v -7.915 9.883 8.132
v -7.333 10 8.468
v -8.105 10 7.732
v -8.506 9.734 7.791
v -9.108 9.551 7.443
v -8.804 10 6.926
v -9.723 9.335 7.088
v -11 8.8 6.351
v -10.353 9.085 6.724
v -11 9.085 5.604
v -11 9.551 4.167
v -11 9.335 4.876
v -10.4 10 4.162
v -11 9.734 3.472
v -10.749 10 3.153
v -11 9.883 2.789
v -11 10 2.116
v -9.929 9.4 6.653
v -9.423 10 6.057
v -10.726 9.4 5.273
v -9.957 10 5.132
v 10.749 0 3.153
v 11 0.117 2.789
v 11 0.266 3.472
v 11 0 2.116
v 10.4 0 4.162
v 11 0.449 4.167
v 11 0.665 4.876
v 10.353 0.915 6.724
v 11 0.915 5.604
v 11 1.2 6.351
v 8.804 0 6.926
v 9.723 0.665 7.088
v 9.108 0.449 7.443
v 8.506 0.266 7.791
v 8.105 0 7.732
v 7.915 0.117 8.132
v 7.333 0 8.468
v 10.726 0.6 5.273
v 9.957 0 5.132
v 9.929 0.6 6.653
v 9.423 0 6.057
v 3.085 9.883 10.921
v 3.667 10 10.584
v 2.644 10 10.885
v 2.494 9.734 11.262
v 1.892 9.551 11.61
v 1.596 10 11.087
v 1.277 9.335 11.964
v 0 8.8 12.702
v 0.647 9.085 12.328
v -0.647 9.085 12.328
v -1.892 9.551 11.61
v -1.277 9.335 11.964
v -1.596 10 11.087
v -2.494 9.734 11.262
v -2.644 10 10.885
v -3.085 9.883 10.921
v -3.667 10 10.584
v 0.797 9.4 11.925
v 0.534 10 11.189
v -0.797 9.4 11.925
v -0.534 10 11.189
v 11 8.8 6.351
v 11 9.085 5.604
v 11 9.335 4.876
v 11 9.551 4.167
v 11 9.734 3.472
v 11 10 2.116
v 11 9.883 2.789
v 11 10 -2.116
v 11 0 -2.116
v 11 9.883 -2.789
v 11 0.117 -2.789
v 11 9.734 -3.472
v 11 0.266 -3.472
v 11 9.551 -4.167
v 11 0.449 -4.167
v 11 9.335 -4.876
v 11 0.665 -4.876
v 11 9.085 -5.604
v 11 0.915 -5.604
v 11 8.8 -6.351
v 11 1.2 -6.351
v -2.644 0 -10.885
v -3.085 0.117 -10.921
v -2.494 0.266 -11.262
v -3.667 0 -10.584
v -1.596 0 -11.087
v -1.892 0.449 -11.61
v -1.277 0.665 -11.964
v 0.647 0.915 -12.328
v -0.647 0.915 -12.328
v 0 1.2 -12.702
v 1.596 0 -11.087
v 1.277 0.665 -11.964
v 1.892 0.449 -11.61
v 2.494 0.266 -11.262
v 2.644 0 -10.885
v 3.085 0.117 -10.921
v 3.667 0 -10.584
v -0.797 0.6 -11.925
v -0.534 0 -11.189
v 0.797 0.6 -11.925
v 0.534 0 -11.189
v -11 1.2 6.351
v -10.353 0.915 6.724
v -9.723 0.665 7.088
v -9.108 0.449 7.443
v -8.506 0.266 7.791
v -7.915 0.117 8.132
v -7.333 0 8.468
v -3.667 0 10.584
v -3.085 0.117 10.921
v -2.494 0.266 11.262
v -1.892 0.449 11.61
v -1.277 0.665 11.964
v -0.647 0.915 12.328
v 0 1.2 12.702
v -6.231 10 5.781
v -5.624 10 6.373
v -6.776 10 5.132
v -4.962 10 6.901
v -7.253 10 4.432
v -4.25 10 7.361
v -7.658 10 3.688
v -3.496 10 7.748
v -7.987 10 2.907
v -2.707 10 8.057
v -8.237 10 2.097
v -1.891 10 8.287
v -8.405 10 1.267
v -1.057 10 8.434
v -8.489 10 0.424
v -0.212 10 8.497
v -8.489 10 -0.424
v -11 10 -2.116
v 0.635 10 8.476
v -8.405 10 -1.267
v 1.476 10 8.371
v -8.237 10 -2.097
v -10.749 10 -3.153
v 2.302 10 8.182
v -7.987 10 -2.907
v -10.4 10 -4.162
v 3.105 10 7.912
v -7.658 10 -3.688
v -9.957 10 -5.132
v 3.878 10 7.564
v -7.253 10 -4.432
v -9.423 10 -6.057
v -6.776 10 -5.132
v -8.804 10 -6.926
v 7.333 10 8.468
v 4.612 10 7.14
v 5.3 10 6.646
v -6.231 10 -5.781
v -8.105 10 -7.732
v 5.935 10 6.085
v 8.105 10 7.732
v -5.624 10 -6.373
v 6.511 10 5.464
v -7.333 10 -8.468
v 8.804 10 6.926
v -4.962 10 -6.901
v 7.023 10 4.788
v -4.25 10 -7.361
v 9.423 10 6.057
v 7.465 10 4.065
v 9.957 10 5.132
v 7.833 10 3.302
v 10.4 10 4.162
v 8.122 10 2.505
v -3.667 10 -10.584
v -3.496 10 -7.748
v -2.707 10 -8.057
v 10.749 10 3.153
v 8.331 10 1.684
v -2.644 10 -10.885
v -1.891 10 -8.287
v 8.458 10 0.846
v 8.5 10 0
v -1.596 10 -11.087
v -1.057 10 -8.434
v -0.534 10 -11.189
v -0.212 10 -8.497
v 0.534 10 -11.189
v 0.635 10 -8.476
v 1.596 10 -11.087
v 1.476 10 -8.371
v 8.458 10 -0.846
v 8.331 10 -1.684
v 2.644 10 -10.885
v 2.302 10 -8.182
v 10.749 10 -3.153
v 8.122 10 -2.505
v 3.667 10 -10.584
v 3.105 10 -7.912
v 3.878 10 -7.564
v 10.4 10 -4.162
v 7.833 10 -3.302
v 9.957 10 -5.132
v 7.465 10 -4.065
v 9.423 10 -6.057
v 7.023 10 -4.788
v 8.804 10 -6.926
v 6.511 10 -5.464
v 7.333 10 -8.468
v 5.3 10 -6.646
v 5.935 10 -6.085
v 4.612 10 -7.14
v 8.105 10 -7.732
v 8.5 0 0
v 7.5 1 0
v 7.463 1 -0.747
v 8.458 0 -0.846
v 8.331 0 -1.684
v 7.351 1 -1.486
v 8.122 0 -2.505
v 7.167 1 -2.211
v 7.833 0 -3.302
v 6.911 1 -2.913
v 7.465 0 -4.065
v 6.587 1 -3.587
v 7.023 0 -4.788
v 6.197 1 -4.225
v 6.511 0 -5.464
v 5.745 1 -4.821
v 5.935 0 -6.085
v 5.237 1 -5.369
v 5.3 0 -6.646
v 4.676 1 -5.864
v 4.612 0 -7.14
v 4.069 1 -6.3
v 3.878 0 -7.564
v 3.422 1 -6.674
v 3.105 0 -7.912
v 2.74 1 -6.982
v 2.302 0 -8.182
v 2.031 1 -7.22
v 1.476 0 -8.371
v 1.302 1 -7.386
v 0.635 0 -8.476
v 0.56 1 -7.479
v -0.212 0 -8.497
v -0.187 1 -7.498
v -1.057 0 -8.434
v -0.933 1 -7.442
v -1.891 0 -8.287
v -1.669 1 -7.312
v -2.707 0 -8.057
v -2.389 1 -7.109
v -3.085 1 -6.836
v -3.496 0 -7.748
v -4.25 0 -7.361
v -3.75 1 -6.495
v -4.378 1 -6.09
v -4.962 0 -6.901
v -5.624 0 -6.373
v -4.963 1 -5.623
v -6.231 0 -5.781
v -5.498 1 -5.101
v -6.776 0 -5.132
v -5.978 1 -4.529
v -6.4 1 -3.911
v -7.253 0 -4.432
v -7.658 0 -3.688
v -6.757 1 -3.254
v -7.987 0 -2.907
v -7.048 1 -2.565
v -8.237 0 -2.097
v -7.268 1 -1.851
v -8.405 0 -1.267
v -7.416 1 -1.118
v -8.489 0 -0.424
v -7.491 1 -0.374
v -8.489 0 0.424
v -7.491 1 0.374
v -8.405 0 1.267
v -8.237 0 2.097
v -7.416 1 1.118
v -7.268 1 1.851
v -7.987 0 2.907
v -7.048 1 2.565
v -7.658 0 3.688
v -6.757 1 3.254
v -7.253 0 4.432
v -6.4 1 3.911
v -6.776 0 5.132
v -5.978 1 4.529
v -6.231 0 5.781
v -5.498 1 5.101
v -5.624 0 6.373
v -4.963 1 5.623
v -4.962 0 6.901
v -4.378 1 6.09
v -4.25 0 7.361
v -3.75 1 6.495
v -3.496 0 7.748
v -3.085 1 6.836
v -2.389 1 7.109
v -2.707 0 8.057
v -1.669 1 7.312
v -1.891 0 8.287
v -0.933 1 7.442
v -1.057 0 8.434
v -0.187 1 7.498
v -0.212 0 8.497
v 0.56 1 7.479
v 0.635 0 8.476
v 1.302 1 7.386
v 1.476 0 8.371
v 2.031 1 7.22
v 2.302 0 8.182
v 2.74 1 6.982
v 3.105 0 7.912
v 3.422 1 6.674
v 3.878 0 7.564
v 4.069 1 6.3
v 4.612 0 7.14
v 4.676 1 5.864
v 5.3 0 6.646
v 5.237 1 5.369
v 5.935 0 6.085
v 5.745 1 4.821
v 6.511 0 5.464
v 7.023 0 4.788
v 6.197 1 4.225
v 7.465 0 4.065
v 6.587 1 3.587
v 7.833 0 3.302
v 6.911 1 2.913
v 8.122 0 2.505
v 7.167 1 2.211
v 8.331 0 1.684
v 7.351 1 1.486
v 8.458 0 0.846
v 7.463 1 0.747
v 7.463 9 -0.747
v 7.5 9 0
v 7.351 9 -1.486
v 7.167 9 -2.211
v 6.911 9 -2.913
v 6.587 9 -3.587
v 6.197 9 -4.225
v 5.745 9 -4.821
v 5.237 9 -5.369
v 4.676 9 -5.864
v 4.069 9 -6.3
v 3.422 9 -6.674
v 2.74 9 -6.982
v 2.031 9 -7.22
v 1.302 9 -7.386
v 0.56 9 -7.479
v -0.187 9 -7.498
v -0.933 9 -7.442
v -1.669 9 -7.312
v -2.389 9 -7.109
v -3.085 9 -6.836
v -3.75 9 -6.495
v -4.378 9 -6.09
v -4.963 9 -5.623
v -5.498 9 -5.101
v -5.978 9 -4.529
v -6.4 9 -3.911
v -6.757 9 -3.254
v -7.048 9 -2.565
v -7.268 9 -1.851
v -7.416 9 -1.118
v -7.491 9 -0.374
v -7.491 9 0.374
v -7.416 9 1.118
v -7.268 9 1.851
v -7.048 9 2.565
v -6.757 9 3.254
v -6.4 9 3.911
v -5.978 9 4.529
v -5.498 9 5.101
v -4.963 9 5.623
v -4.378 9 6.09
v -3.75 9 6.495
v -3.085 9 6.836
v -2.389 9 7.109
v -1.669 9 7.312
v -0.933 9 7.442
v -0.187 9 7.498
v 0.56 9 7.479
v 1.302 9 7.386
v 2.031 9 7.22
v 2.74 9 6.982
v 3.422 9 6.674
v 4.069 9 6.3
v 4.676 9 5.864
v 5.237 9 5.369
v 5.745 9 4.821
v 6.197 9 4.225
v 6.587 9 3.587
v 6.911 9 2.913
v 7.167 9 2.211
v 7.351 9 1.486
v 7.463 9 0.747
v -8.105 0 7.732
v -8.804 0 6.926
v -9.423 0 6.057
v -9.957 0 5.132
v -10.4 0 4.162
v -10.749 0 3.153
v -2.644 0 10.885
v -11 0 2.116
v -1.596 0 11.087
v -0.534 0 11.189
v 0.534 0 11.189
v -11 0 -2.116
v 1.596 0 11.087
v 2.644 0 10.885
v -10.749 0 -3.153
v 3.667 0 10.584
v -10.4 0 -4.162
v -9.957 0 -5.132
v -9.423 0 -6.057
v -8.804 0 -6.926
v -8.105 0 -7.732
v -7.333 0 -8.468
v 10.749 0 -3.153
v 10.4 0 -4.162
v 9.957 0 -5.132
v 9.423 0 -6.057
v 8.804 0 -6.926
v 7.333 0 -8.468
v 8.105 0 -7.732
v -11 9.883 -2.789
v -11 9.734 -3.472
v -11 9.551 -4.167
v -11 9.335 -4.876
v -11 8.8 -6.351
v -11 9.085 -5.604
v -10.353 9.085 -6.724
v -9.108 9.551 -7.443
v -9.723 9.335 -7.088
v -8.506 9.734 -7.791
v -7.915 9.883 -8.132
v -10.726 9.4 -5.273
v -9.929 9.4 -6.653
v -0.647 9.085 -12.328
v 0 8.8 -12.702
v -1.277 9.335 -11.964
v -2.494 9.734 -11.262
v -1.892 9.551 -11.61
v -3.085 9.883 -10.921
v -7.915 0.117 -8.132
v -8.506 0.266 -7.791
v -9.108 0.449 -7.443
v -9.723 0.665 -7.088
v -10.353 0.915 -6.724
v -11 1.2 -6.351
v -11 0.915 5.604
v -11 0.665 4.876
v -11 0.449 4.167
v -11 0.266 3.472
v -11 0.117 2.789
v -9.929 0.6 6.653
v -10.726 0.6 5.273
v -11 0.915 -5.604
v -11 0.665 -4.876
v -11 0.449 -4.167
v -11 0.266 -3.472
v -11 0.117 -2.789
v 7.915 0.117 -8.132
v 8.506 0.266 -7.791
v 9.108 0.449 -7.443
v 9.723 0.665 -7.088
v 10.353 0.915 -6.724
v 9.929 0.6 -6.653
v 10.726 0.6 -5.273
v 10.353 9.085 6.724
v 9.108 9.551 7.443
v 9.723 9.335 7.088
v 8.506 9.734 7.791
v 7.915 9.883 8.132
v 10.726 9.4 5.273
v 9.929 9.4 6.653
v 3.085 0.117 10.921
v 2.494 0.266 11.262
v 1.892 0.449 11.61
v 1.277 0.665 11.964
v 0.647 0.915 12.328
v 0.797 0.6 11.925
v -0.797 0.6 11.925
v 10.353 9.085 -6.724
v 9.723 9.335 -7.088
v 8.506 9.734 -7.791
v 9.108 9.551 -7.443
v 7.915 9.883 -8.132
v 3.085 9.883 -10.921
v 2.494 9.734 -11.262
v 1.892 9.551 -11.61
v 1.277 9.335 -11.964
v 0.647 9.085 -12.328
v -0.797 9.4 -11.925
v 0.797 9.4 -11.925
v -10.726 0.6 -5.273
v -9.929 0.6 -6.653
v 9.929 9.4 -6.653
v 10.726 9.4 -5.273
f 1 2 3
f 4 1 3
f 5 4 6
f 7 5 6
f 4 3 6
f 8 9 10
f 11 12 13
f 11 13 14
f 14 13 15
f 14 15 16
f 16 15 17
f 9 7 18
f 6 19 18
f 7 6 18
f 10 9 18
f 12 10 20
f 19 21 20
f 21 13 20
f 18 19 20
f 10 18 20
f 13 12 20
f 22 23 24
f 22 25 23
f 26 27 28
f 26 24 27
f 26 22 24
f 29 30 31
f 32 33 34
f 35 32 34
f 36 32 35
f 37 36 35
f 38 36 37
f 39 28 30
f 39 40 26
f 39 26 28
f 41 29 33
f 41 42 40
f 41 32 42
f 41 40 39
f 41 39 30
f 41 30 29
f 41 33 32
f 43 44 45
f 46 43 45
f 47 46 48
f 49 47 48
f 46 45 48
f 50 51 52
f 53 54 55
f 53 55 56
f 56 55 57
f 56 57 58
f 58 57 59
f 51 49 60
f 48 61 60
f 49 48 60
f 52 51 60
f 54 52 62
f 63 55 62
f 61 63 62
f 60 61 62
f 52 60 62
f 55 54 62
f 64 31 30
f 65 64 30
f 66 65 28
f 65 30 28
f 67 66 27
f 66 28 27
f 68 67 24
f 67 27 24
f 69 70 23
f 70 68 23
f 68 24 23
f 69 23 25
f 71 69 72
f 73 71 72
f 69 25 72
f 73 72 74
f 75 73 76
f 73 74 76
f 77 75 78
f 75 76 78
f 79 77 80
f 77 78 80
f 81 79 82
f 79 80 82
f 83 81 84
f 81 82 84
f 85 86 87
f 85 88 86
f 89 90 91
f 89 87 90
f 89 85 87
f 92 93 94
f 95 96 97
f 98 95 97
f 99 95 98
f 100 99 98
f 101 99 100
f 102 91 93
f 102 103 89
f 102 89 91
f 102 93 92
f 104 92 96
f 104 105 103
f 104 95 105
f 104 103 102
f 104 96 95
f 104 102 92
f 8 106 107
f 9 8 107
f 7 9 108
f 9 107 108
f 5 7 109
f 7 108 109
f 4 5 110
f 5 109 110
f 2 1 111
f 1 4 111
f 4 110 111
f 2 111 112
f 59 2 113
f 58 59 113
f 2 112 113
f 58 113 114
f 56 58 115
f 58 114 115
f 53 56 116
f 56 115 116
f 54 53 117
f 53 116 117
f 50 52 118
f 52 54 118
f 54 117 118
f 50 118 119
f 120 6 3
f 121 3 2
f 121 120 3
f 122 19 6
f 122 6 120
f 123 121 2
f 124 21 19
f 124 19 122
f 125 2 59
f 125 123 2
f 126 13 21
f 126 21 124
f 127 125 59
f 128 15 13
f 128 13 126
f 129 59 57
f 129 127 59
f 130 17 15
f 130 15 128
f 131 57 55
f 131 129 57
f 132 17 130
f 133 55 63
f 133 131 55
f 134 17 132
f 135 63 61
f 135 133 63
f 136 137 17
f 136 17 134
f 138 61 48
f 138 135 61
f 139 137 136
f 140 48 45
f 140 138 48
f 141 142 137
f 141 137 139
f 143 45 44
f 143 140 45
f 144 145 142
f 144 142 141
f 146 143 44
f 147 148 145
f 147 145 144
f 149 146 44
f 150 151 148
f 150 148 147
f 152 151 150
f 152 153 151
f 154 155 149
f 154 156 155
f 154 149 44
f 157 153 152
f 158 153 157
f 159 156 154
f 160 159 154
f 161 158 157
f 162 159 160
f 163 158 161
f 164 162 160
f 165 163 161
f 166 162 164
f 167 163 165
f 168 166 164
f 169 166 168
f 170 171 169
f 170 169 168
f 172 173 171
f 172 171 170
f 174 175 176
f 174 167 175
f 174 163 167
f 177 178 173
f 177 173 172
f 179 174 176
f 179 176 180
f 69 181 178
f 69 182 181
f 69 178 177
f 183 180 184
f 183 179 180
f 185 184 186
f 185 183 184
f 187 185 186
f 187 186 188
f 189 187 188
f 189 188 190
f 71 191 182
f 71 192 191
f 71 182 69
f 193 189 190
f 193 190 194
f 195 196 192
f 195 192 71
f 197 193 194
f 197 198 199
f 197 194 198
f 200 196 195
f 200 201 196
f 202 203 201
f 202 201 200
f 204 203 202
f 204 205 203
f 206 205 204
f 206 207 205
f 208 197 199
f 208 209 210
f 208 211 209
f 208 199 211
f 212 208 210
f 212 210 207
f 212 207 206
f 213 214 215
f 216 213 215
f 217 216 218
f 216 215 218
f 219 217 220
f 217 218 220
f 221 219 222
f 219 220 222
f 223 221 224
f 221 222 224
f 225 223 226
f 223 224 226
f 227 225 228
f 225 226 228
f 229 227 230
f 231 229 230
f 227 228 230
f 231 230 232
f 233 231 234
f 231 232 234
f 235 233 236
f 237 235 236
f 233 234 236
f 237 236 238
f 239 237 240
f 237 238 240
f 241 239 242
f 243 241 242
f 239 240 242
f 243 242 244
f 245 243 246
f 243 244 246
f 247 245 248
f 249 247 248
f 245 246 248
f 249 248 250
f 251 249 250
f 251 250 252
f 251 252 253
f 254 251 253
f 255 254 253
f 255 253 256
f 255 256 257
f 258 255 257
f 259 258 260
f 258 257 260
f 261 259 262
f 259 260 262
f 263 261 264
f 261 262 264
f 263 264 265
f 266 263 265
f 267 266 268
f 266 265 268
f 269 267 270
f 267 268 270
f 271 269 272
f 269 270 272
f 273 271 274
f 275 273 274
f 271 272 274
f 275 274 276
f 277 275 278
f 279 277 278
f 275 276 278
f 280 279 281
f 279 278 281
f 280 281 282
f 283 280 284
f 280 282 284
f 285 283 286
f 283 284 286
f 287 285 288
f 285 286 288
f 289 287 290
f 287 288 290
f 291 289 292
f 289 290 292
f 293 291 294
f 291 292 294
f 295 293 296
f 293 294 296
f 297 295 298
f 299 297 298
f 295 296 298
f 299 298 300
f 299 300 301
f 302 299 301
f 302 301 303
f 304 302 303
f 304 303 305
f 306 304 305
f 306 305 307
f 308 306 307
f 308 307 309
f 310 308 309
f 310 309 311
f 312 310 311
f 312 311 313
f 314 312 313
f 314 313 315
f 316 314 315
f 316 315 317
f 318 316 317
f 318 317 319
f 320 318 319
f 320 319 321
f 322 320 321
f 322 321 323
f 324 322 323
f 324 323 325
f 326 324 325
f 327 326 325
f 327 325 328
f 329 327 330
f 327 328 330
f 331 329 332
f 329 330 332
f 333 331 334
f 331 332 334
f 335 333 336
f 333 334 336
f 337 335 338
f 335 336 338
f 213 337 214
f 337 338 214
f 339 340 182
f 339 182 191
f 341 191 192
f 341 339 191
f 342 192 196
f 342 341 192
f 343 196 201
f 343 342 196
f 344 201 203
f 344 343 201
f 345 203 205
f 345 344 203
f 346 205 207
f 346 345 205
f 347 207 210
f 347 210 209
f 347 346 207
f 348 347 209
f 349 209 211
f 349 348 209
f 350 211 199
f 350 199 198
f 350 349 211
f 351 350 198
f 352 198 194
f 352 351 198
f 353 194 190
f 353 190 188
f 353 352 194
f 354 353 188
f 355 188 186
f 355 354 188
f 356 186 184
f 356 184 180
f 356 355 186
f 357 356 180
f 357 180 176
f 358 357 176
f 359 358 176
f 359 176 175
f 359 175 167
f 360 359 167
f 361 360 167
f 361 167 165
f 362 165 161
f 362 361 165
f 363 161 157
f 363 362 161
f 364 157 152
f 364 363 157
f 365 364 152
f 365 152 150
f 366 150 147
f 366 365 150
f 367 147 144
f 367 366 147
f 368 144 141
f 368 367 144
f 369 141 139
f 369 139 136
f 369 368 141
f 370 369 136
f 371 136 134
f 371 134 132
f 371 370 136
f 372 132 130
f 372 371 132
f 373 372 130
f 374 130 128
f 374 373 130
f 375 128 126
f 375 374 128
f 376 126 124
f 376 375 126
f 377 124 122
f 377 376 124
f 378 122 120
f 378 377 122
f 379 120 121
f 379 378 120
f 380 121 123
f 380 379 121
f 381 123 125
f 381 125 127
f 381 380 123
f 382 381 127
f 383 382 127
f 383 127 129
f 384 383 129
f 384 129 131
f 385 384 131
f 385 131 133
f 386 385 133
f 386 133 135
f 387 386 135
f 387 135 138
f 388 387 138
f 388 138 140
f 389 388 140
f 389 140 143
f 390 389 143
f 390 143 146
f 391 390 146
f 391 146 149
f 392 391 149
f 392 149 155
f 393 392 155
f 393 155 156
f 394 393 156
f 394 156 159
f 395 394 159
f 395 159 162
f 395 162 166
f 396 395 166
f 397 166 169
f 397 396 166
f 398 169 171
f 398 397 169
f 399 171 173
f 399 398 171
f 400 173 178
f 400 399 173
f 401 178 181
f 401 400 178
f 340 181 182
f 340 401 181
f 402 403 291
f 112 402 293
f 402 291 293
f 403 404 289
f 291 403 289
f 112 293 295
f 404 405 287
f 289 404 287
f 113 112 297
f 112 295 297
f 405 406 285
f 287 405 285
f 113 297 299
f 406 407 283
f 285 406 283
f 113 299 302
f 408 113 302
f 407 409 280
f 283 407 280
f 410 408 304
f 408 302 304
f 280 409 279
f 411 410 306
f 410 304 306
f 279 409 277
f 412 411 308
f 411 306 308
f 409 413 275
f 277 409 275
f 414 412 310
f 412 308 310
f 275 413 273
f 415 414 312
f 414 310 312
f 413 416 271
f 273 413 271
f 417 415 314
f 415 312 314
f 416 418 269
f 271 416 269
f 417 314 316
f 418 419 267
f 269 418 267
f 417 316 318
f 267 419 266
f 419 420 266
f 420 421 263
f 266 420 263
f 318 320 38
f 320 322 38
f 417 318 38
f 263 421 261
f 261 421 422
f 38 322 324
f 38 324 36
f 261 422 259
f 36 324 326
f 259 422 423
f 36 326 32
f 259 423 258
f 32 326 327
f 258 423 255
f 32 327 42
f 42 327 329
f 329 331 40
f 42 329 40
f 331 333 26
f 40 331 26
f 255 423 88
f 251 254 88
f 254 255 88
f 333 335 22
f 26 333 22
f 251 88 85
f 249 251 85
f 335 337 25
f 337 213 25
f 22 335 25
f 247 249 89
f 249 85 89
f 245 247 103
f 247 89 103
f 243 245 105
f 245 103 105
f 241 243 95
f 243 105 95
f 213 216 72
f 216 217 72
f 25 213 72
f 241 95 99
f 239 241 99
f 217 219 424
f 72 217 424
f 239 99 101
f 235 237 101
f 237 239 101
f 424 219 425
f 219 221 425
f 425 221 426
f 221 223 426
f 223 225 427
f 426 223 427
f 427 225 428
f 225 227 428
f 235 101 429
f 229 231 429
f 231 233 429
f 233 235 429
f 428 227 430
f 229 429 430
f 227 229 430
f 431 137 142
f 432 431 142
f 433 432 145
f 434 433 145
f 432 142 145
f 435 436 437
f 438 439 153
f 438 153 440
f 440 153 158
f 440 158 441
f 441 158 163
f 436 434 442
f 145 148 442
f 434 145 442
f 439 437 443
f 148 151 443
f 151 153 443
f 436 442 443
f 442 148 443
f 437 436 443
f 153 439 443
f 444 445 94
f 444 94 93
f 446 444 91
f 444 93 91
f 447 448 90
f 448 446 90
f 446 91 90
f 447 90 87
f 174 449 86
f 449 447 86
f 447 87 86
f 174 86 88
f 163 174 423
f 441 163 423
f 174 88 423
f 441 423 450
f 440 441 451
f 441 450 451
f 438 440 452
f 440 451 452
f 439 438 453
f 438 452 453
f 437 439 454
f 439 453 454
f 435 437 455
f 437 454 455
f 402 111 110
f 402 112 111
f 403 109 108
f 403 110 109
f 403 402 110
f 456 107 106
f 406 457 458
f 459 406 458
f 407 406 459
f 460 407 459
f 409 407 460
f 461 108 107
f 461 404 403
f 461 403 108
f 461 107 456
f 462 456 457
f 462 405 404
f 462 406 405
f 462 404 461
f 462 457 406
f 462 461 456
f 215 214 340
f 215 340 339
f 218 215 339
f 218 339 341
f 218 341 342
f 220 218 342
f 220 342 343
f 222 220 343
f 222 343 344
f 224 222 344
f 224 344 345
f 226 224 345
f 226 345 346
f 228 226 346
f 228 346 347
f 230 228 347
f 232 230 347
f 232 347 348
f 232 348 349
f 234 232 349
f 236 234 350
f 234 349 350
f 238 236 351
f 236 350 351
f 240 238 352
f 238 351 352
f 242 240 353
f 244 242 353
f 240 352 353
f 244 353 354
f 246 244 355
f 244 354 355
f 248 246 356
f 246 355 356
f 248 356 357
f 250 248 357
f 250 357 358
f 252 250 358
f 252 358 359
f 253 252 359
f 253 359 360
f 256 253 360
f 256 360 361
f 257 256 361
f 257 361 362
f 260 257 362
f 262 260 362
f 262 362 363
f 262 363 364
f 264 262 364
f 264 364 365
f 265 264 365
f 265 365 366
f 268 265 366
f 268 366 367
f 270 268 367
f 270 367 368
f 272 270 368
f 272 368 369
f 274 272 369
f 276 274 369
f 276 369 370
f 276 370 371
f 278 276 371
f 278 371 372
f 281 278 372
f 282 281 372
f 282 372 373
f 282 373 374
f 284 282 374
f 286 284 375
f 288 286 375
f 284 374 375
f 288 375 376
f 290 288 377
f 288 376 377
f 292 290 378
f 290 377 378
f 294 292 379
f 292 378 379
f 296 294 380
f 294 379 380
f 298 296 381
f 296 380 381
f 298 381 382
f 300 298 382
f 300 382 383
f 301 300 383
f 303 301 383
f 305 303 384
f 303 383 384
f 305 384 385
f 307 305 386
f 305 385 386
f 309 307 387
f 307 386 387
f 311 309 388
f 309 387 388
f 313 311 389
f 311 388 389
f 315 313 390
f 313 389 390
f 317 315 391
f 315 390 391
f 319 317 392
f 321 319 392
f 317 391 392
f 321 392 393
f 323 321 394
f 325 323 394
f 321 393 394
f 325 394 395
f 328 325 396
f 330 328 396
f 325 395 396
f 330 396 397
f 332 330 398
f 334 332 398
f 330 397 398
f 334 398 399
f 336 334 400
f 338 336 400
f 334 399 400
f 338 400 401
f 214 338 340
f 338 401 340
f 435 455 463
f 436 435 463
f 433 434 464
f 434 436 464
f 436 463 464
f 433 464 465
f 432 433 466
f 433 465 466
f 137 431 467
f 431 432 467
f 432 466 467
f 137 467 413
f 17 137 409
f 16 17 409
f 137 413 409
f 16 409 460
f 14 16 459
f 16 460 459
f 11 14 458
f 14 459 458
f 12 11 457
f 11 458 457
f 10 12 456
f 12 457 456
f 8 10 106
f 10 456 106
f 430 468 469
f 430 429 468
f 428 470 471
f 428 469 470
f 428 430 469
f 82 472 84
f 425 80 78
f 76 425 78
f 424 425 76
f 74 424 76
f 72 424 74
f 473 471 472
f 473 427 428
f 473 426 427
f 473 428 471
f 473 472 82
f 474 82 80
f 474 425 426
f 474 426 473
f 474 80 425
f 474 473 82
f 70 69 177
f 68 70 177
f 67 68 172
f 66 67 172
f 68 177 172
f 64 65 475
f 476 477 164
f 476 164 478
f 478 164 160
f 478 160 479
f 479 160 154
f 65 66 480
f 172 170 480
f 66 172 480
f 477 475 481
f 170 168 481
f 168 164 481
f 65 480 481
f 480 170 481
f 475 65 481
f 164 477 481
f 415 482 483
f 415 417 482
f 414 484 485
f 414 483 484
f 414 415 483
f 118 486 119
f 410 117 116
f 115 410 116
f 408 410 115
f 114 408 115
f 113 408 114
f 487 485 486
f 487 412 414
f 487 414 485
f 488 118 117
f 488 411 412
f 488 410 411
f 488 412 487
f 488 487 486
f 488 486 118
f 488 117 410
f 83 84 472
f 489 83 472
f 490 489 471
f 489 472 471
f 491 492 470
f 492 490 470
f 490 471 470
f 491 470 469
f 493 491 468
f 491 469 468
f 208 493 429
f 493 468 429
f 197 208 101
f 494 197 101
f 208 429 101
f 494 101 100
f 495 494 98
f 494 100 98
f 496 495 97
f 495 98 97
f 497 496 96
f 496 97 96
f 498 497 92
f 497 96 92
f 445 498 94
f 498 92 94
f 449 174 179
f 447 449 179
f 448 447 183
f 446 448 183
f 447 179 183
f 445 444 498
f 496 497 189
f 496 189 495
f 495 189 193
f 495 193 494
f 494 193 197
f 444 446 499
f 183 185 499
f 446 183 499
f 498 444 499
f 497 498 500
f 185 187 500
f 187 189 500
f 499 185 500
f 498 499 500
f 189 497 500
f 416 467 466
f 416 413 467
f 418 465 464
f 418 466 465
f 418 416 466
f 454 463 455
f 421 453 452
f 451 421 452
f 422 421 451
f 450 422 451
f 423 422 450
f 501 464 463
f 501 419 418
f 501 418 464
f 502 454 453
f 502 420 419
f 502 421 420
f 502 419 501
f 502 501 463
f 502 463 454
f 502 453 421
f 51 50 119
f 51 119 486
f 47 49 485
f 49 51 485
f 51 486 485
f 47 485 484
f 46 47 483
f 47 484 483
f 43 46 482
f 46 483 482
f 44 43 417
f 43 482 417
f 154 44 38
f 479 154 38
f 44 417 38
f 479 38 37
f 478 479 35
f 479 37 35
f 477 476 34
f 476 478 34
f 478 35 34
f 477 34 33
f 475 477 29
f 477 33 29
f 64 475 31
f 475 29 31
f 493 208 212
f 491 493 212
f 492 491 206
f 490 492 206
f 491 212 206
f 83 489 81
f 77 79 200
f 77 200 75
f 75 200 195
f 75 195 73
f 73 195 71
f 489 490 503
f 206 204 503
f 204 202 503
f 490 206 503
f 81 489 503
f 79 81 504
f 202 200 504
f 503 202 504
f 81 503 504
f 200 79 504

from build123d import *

# Parameters (mm, degrees)
BOSS_EXTRUDE1_DEPTH = 10
SKETCH4_R           = 7.5
CUT_EXTRUDE1_DEPTH  = 11
CHAMFER1_SIZE       = 1


with BuildPart() as part:
    # Sketch3 → Boss-Extrude1 (new body)
    with BuildSketch(Plane(origin=(0, 0, 0), x_dir=(1, 0, 0), z_dir=(0, 1, 0))):
        Polygon((-11, 6.350852961), (-11, -6.350852961), (0, -12.701705922), (11, -6.350852961), (11, 6.350852961), (0, 12.701705922), align=None)
    extrude(amount=BOSS_EXTRUDE1_DEPTH)

    # Sketch4 → Cut-Extrude1 (cut, through all)
    with BuildSketch(Plane(origin=(0, 10, 0), x_dir=(1, 0, 0), z_dir=(0, 1, 0))):
        Circle(SKETCH4_R)
    extrude(amount=-CUT_EXTRUDE1_DEPTH, mode=Mode.SUBTRACT)

    # Chamfer1
    chamfer1_edges = [part.edges().sort_by_distance(p)[0] for p in [
        (-7.5, 0, 0),
        (-7.5, 10, 0),
    ]]
    chamfer(chamfer1_edges, length=CHAMFER1_SIZE)

    # Sketch5 → Cut-Revolve1 (revolve, cut)
    with BuildSketch(Plane(origin=(0, 0, 0), x_dir=(0, 0, -1), z_dir=(1, 0, 0))):
        Polygon((-12.701705922, 10), (-12.701705922, 8.8), (-11.201705922, 10), align=None)
        Polygon((-12.701705922, 0), (-12.701705922, 1.2), (-11.201705922, 0), align=None)
    revolve(axis=Axis((0, 13.174691504, 0), (0, -1, 0)), mode=Mode.SUBTRACT)


solid = part.part
